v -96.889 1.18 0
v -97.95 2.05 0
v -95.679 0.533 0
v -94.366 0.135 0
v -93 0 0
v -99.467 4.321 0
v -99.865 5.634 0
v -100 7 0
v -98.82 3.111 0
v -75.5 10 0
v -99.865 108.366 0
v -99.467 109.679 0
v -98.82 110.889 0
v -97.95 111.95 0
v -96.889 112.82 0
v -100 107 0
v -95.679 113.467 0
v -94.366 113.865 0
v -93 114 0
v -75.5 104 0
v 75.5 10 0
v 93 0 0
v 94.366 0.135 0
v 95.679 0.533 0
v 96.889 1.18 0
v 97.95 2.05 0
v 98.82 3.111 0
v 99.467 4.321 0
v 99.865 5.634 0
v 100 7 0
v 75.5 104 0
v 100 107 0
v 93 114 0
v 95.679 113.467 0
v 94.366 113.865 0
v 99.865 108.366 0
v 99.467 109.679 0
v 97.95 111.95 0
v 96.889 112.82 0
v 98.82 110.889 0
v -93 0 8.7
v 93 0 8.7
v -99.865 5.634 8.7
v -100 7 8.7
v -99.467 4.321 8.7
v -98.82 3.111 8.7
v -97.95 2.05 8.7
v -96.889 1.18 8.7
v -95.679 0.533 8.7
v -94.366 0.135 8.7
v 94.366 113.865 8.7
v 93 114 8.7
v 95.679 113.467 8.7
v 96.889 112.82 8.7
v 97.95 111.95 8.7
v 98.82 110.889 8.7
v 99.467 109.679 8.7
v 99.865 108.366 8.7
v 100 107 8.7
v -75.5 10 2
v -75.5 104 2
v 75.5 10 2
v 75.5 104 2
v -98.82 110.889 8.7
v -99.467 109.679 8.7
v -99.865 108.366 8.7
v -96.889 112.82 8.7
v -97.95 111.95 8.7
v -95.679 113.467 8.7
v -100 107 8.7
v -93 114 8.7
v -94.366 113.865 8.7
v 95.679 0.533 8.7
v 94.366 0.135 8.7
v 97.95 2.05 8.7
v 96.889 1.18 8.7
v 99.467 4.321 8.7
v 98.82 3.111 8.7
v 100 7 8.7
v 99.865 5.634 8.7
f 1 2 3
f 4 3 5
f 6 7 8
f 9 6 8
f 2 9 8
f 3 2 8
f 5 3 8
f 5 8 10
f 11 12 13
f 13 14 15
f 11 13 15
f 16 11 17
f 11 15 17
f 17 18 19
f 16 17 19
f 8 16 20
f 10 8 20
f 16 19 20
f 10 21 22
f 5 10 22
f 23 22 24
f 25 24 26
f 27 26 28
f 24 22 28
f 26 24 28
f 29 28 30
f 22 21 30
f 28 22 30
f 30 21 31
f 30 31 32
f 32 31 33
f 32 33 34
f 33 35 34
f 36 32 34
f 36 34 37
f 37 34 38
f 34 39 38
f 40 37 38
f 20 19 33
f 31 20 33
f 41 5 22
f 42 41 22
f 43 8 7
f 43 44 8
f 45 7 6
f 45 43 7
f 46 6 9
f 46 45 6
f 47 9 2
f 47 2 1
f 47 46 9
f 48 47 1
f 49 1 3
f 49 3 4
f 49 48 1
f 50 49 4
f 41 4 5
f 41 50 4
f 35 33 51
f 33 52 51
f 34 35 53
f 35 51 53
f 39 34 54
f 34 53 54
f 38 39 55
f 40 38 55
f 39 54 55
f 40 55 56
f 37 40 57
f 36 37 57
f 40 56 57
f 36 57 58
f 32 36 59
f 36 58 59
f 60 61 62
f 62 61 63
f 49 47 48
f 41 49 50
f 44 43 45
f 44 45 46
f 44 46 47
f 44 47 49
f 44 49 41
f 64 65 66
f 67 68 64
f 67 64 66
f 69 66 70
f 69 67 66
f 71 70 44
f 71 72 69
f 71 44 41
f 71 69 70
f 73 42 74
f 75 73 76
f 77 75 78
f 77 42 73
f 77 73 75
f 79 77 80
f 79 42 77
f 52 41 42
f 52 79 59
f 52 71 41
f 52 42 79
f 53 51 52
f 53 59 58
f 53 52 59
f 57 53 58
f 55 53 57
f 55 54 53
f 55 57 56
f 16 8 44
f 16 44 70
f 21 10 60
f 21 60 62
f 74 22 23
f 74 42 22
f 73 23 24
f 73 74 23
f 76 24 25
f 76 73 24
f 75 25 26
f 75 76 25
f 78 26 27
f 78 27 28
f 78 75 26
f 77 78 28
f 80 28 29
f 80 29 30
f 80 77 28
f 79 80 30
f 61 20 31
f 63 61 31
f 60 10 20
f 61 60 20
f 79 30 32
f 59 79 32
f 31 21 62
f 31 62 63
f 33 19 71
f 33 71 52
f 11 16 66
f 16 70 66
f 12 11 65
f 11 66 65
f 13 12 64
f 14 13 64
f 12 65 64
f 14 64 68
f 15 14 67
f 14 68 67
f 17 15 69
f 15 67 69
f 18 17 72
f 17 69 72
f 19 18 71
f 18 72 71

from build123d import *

# Parameters (mm, degrees)
SKETCH1_W           = 200
SKETCH1_H           = 114
BOSS_EXTRUDE1_DEPTH = 8.7
SKETCH1_3_W         = 151
SKETCH1_3_H         = 94
CUT_EXTRUDE1_DEPTH  = 2
FILLET1_R           = 7


with BuildPart() as part:
    # Sketch1 → Boss-Extrude1 (new body)
    with BuildSketch(Plane.XY):
        with Locations((0, 57)):
            Rectangle(SKETCH1_W, SKETCH1_H)
    extrude(amount=BOSS_EXTRUDE1_DEPTH)

    # Sketch1<3> → Cut-Extrude1 (cut)
    with BuildSketch(Plane.XY):
        with Locations((0, 57)):
            Rectangle(SKETCH1_3_W, SKETCH1_3_H)
    extrude(amount=CUT_EXTRUDE1_DEPTH, mode=Mode.SUBTRACT)

    # Fillet1
    fillet1_edges = [part.edges().sort_by_distance(p)[0] for p in [
        (-100, 0, 4.35),
        (100, 0, 4.35),
        (100, 114, 4.35),
        (-100, 114, 4.35),
    ]]
    fillet(fillet1_edges, radius=FILLET1_R)


solid = part.part
